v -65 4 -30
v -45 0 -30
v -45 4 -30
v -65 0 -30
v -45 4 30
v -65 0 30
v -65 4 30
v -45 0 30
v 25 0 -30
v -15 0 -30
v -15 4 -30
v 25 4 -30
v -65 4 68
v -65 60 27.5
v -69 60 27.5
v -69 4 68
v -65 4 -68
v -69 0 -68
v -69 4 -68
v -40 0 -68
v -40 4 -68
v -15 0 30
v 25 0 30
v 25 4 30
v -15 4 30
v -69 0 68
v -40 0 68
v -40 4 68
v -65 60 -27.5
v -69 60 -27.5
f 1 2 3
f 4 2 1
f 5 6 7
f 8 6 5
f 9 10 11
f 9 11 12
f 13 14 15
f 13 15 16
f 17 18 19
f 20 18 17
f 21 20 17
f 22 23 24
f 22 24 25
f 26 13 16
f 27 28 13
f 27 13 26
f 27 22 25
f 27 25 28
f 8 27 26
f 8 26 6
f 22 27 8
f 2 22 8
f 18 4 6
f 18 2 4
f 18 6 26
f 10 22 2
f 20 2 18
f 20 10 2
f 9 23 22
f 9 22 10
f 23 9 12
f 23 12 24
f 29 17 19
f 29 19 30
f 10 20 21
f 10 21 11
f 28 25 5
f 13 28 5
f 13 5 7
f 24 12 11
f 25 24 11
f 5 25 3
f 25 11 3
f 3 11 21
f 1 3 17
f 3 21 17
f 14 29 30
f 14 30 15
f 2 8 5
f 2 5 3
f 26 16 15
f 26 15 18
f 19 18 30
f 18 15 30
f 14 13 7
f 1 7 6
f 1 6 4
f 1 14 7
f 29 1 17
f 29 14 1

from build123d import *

# Parameters (mm, degrees)
BOSS_EXTRUDE1_DEPTH = 4
BOSS_EXTRUDE3_DEPTH = 4


with BuildPart() as part:
    # Sketch1 → Boss-Extrude1 (new body)
    with BuildSketch(Plane(origin=(0, 0, 0), x_dir=(1, 0, 0), z_dir=(0, 1, 0))):
        Polygon((-15, 30), (25, 30), (25, -30), (-15, -30), (-40, -68), (-65, -68), (-65, -30), (-45, -30), (-45, 30), (-65, 30), (-65, 68), (-40, 68), align=None)
    extrude(amount=BOSS_EXTRUDE1_DEPTH)

    # Sketch3 → Boss-Extrude3 (add)
    with BuildSketch(Plane.ZY.offset(65)):
        Polygon((-68, 0), (-68, 4), (-27.5, 60), (27.5, 60), (68, 4), (68, 0), align=None)
    extrude(amount=BOSS_EXTRUDE3_DEPTH)


solid = part.part
